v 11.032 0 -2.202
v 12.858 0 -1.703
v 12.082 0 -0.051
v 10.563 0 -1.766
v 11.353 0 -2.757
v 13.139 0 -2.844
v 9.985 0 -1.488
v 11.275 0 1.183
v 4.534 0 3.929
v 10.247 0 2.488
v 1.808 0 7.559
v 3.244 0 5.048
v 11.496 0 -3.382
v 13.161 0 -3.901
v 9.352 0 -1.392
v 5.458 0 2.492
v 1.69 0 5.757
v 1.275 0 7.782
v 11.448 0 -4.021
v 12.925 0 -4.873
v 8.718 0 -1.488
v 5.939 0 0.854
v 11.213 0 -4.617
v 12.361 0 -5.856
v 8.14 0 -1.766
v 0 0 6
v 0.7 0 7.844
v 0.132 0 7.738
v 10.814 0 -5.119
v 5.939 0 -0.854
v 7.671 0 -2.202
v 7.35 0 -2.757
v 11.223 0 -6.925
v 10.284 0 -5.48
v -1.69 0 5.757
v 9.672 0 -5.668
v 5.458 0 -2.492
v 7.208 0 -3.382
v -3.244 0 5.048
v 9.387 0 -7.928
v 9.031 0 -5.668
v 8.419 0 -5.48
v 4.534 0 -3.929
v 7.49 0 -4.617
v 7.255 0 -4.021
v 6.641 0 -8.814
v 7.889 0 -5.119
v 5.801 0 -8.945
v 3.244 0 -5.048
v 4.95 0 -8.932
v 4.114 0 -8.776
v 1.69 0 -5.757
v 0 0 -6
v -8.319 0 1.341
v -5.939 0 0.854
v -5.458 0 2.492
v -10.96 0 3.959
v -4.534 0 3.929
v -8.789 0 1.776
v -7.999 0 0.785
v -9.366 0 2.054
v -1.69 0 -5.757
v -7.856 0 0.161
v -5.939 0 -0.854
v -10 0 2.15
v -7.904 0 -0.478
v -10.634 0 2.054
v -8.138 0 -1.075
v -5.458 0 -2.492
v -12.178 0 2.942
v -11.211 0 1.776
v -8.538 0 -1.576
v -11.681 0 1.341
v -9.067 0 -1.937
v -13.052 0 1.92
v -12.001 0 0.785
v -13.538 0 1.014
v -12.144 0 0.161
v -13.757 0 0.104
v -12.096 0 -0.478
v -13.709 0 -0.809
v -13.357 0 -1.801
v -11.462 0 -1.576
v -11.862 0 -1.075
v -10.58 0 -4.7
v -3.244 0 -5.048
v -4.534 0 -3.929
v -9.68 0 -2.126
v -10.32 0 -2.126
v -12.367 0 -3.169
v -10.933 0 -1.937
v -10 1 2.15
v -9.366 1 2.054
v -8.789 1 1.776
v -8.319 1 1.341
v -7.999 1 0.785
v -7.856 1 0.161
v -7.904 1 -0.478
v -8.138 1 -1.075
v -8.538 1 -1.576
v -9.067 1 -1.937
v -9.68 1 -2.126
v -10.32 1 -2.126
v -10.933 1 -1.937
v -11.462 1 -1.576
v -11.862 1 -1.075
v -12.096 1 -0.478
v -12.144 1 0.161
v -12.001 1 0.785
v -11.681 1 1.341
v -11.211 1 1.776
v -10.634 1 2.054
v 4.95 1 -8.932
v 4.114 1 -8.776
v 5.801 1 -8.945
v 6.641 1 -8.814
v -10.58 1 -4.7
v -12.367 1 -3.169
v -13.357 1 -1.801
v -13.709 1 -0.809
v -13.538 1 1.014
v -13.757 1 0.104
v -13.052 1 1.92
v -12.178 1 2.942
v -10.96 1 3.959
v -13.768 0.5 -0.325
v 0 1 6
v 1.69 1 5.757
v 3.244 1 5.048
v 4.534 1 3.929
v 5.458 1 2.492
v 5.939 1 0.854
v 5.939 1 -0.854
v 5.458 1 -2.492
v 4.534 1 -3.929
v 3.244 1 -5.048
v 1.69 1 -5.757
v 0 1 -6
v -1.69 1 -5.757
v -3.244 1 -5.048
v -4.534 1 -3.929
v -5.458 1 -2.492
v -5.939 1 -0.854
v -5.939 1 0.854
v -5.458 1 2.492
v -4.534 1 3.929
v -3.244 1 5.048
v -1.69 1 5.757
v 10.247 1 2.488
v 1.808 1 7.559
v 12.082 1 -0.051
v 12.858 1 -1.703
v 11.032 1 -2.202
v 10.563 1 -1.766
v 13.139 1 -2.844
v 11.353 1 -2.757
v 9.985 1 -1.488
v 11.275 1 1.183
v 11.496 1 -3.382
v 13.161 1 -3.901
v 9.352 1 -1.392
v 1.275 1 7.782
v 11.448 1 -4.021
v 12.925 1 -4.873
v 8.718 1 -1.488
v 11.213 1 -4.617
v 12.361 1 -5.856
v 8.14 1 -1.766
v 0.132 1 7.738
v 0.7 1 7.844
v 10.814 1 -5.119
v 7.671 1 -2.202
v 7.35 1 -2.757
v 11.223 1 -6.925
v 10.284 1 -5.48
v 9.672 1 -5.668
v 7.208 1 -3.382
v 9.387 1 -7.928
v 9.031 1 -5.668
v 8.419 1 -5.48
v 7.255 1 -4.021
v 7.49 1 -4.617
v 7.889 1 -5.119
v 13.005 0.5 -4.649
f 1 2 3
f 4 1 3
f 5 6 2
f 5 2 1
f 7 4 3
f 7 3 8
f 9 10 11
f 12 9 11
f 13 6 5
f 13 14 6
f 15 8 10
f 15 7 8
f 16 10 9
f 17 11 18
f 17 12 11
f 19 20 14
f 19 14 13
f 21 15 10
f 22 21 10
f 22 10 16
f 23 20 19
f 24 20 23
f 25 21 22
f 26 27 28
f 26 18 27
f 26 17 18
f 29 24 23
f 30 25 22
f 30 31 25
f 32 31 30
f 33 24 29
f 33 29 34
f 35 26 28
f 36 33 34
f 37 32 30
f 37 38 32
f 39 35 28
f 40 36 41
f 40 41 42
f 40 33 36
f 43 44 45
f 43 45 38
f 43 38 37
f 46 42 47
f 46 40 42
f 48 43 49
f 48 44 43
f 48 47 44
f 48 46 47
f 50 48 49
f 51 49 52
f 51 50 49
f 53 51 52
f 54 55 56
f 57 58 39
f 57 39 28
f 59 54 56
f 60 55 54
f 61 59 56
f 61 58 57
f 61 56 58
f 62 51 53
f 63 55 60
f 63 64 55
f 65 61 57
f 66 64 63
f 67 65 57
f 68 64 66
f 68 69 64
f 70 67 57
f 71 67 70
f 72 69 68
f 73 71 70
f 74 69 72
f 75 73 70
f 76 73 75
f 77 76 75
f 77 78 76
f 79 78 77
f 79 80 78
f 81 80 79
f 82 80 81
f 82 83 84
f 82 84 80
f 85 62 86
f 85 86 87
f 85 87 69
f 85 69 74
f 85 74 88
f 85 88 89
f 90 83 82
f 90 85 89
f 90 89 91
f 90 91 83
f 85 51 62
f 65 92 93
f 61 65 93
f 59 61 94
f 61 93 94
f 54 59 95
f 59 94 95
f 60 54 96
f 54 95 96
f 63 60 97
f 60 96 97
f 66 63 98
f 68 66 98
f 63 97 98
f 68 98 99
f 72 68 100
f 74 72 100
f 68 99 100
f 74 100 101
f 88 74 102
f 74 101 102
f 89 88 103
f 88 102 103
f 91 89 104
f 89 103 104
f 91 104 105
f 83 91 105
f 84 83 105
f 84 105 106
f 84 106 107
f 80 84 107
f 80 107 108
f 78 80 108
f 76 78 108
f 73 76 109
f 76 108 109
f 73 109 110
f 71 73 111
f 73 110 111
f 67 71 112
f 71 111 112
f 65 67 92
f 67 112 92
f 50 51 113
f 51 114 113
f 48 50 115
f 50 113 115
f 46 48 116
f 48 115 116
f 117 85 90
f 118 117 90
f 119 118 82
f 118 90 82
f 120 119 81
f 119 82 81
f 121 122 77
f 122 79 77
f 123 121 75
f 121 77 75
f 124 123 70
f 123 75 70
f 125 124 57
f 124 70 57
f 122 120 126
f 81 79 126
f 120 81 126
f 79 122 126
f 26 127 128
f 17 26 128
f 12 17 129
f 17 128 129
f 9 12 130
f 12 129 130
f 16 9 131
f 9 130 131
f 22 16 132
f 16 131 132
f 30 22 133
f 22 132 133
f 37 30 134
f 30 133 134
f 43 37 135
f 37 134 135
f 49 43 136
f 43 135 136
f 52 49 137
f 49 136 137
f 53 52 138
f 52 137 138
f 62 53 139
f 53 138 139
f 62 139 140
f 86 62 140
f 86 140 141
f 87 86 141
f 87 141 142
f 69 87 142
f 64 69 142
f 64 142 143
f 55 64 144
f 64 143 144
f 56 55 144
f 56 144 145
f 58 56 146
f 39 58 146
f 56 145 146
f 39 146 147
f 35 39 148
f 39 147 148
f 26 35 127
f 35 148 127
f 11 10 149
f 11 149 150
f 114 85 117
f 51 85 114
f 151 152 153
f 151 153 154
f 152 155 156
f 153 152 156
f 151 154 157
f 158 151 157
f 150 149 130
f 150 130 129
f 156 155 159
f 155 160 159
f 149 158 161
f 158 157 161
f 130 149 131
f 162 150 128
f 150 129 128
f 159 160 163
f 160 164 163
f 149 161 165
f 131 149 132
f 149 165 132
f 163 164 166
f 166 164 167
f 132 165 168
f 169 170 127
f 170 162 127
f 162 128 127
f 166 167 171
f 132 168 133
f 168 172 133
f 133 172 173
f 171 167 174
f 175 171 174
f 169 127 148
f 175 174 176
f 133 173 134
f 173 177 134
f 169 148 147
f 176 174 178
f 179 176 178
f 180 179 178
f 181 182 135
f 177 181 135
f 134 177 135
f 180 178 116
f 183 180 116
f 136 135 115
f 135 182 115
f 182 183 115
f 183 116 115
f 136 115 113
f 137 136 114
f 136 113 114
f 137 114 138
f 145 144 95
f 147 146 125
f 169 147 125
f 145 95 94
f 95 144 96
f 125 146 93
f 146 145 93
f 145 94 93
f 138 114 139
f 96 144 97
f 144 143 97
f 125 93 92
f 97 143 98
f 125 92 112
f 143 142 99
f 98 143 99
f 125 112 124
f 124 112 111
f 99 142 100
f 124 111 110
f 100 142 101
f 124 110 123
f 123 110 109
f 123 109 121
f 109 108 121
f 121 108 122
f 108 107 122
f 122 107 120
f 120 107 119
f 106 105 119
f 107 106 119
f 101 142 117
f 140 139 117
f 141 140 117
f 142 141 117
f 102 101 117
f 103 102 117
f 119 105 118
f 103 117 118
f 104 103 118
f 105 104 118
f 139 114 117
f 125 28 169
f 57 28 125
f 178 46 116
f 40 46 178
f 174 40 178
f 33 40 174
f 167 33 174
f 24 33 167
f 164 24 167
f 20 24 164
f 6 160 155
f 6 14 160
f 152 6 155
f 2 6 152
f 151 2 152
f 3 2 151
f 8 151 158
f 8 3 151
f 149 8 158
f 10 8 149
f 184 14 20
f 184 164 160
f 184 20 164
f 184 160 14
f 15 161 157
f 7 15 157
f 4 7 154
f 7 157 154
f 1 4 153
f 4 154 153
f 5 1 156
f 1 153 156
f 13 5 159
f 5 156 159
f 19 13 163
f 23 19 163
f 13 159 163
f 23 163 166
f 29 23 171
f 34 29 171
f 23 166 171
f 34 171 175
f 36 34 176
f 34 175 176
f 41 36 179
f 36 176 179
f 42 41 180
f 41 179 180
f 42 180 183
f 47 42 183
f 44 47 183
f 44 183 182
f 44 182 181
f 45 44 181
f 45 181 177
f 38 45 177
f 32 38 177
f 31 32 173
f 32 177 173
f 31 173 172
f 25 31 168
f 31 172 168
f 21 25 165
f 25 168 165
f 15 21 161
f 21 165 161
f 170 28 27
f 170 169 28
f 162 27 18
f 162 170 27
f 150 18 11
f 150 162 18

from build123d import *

# Parameters (mm, degrees)
BOSS_EXTRUDE2_DEPTH = 1
SKETCH3_R           = 6
SKETCH3_R_2         = 2.15
CUT_EXTRUDE1_DEPTH  = 1
FILLET1_R           = 2
FILLET4_R           = 5


with BuildPart() as part:
    # Sketch1 → Boss-Extrude2 (new body)
    with BuildSketch(Plane(origin=(0, 0, 0), x_dir=(1, 0, 0), z_dir=(0, 1, 0))):
        with BuildLine():
            Line((-10.579737185, 4.699562588), (5.304686116, 9.105985786))
            add(Edge.make_bspline(
                [(5.304686116, 9.105985786), (17.993455135, 6.637762386), (10.246572083, -2.487952551)],
                knots=[0, 0, 0, 1, 1, 1], degree=2))
            Line((10.246572083, -2.487952551), (1.011646395, -8.037716806))
            Line((1.011646395, -8.037716806), (-10.959675931, -3.958567779))
            add(Edge.make_bspline(
                [(-10.579737185, 4.699562588), (-16.765680179, 0.278506662), (-10.959675931, -3.958567779)],
                knots=[0, 0, 0, 1, 1, 1], degree=2))
        make_face()
    extrude(amount=BOSS_EXTRUDE2_DEPTH)

    # Sketch3 → Cut-Extrude1 (cut)
    with BuildSketch(Plane(origin=(0, 1, 0), x_dir=(1, 0, 0), z_dir=(0, 1, 0))):
        with Locations(Location((0, 0, 0), (0, 0, 270))):
            Circle(SKETCH3_R)
        with Locations(Location((-10, 0, 0), (0, 0, 270))):
            Circle(SKETCH3_R_2)
        with Locations(Location((9.351513774, 3.542483611, 0), (0, 0, 270))):
            Circle(SKETCH3_R_2)
    extrude(amount=-CUT_EXTRUDE1_DEPTH, mode=Mode.SUBTRACT)

    # Fillet1
    fillet1_edges = [part.edges().sort_by_distance(p)[0] for p in [
        (1.011646395, 0.5, 8.037716806),
    ]]
    fillet(fillet1_edges, radius=FILLET1_R)

    # Fillet4
    fillet4_edges = [part.edges().sort_by_distance(p)[0] for p in [
        (5.304686116, 0.5, -9.105985786),
    ]]
    fillet(fillet4_edges, radius=FILLET4_R)


solid = part.part
